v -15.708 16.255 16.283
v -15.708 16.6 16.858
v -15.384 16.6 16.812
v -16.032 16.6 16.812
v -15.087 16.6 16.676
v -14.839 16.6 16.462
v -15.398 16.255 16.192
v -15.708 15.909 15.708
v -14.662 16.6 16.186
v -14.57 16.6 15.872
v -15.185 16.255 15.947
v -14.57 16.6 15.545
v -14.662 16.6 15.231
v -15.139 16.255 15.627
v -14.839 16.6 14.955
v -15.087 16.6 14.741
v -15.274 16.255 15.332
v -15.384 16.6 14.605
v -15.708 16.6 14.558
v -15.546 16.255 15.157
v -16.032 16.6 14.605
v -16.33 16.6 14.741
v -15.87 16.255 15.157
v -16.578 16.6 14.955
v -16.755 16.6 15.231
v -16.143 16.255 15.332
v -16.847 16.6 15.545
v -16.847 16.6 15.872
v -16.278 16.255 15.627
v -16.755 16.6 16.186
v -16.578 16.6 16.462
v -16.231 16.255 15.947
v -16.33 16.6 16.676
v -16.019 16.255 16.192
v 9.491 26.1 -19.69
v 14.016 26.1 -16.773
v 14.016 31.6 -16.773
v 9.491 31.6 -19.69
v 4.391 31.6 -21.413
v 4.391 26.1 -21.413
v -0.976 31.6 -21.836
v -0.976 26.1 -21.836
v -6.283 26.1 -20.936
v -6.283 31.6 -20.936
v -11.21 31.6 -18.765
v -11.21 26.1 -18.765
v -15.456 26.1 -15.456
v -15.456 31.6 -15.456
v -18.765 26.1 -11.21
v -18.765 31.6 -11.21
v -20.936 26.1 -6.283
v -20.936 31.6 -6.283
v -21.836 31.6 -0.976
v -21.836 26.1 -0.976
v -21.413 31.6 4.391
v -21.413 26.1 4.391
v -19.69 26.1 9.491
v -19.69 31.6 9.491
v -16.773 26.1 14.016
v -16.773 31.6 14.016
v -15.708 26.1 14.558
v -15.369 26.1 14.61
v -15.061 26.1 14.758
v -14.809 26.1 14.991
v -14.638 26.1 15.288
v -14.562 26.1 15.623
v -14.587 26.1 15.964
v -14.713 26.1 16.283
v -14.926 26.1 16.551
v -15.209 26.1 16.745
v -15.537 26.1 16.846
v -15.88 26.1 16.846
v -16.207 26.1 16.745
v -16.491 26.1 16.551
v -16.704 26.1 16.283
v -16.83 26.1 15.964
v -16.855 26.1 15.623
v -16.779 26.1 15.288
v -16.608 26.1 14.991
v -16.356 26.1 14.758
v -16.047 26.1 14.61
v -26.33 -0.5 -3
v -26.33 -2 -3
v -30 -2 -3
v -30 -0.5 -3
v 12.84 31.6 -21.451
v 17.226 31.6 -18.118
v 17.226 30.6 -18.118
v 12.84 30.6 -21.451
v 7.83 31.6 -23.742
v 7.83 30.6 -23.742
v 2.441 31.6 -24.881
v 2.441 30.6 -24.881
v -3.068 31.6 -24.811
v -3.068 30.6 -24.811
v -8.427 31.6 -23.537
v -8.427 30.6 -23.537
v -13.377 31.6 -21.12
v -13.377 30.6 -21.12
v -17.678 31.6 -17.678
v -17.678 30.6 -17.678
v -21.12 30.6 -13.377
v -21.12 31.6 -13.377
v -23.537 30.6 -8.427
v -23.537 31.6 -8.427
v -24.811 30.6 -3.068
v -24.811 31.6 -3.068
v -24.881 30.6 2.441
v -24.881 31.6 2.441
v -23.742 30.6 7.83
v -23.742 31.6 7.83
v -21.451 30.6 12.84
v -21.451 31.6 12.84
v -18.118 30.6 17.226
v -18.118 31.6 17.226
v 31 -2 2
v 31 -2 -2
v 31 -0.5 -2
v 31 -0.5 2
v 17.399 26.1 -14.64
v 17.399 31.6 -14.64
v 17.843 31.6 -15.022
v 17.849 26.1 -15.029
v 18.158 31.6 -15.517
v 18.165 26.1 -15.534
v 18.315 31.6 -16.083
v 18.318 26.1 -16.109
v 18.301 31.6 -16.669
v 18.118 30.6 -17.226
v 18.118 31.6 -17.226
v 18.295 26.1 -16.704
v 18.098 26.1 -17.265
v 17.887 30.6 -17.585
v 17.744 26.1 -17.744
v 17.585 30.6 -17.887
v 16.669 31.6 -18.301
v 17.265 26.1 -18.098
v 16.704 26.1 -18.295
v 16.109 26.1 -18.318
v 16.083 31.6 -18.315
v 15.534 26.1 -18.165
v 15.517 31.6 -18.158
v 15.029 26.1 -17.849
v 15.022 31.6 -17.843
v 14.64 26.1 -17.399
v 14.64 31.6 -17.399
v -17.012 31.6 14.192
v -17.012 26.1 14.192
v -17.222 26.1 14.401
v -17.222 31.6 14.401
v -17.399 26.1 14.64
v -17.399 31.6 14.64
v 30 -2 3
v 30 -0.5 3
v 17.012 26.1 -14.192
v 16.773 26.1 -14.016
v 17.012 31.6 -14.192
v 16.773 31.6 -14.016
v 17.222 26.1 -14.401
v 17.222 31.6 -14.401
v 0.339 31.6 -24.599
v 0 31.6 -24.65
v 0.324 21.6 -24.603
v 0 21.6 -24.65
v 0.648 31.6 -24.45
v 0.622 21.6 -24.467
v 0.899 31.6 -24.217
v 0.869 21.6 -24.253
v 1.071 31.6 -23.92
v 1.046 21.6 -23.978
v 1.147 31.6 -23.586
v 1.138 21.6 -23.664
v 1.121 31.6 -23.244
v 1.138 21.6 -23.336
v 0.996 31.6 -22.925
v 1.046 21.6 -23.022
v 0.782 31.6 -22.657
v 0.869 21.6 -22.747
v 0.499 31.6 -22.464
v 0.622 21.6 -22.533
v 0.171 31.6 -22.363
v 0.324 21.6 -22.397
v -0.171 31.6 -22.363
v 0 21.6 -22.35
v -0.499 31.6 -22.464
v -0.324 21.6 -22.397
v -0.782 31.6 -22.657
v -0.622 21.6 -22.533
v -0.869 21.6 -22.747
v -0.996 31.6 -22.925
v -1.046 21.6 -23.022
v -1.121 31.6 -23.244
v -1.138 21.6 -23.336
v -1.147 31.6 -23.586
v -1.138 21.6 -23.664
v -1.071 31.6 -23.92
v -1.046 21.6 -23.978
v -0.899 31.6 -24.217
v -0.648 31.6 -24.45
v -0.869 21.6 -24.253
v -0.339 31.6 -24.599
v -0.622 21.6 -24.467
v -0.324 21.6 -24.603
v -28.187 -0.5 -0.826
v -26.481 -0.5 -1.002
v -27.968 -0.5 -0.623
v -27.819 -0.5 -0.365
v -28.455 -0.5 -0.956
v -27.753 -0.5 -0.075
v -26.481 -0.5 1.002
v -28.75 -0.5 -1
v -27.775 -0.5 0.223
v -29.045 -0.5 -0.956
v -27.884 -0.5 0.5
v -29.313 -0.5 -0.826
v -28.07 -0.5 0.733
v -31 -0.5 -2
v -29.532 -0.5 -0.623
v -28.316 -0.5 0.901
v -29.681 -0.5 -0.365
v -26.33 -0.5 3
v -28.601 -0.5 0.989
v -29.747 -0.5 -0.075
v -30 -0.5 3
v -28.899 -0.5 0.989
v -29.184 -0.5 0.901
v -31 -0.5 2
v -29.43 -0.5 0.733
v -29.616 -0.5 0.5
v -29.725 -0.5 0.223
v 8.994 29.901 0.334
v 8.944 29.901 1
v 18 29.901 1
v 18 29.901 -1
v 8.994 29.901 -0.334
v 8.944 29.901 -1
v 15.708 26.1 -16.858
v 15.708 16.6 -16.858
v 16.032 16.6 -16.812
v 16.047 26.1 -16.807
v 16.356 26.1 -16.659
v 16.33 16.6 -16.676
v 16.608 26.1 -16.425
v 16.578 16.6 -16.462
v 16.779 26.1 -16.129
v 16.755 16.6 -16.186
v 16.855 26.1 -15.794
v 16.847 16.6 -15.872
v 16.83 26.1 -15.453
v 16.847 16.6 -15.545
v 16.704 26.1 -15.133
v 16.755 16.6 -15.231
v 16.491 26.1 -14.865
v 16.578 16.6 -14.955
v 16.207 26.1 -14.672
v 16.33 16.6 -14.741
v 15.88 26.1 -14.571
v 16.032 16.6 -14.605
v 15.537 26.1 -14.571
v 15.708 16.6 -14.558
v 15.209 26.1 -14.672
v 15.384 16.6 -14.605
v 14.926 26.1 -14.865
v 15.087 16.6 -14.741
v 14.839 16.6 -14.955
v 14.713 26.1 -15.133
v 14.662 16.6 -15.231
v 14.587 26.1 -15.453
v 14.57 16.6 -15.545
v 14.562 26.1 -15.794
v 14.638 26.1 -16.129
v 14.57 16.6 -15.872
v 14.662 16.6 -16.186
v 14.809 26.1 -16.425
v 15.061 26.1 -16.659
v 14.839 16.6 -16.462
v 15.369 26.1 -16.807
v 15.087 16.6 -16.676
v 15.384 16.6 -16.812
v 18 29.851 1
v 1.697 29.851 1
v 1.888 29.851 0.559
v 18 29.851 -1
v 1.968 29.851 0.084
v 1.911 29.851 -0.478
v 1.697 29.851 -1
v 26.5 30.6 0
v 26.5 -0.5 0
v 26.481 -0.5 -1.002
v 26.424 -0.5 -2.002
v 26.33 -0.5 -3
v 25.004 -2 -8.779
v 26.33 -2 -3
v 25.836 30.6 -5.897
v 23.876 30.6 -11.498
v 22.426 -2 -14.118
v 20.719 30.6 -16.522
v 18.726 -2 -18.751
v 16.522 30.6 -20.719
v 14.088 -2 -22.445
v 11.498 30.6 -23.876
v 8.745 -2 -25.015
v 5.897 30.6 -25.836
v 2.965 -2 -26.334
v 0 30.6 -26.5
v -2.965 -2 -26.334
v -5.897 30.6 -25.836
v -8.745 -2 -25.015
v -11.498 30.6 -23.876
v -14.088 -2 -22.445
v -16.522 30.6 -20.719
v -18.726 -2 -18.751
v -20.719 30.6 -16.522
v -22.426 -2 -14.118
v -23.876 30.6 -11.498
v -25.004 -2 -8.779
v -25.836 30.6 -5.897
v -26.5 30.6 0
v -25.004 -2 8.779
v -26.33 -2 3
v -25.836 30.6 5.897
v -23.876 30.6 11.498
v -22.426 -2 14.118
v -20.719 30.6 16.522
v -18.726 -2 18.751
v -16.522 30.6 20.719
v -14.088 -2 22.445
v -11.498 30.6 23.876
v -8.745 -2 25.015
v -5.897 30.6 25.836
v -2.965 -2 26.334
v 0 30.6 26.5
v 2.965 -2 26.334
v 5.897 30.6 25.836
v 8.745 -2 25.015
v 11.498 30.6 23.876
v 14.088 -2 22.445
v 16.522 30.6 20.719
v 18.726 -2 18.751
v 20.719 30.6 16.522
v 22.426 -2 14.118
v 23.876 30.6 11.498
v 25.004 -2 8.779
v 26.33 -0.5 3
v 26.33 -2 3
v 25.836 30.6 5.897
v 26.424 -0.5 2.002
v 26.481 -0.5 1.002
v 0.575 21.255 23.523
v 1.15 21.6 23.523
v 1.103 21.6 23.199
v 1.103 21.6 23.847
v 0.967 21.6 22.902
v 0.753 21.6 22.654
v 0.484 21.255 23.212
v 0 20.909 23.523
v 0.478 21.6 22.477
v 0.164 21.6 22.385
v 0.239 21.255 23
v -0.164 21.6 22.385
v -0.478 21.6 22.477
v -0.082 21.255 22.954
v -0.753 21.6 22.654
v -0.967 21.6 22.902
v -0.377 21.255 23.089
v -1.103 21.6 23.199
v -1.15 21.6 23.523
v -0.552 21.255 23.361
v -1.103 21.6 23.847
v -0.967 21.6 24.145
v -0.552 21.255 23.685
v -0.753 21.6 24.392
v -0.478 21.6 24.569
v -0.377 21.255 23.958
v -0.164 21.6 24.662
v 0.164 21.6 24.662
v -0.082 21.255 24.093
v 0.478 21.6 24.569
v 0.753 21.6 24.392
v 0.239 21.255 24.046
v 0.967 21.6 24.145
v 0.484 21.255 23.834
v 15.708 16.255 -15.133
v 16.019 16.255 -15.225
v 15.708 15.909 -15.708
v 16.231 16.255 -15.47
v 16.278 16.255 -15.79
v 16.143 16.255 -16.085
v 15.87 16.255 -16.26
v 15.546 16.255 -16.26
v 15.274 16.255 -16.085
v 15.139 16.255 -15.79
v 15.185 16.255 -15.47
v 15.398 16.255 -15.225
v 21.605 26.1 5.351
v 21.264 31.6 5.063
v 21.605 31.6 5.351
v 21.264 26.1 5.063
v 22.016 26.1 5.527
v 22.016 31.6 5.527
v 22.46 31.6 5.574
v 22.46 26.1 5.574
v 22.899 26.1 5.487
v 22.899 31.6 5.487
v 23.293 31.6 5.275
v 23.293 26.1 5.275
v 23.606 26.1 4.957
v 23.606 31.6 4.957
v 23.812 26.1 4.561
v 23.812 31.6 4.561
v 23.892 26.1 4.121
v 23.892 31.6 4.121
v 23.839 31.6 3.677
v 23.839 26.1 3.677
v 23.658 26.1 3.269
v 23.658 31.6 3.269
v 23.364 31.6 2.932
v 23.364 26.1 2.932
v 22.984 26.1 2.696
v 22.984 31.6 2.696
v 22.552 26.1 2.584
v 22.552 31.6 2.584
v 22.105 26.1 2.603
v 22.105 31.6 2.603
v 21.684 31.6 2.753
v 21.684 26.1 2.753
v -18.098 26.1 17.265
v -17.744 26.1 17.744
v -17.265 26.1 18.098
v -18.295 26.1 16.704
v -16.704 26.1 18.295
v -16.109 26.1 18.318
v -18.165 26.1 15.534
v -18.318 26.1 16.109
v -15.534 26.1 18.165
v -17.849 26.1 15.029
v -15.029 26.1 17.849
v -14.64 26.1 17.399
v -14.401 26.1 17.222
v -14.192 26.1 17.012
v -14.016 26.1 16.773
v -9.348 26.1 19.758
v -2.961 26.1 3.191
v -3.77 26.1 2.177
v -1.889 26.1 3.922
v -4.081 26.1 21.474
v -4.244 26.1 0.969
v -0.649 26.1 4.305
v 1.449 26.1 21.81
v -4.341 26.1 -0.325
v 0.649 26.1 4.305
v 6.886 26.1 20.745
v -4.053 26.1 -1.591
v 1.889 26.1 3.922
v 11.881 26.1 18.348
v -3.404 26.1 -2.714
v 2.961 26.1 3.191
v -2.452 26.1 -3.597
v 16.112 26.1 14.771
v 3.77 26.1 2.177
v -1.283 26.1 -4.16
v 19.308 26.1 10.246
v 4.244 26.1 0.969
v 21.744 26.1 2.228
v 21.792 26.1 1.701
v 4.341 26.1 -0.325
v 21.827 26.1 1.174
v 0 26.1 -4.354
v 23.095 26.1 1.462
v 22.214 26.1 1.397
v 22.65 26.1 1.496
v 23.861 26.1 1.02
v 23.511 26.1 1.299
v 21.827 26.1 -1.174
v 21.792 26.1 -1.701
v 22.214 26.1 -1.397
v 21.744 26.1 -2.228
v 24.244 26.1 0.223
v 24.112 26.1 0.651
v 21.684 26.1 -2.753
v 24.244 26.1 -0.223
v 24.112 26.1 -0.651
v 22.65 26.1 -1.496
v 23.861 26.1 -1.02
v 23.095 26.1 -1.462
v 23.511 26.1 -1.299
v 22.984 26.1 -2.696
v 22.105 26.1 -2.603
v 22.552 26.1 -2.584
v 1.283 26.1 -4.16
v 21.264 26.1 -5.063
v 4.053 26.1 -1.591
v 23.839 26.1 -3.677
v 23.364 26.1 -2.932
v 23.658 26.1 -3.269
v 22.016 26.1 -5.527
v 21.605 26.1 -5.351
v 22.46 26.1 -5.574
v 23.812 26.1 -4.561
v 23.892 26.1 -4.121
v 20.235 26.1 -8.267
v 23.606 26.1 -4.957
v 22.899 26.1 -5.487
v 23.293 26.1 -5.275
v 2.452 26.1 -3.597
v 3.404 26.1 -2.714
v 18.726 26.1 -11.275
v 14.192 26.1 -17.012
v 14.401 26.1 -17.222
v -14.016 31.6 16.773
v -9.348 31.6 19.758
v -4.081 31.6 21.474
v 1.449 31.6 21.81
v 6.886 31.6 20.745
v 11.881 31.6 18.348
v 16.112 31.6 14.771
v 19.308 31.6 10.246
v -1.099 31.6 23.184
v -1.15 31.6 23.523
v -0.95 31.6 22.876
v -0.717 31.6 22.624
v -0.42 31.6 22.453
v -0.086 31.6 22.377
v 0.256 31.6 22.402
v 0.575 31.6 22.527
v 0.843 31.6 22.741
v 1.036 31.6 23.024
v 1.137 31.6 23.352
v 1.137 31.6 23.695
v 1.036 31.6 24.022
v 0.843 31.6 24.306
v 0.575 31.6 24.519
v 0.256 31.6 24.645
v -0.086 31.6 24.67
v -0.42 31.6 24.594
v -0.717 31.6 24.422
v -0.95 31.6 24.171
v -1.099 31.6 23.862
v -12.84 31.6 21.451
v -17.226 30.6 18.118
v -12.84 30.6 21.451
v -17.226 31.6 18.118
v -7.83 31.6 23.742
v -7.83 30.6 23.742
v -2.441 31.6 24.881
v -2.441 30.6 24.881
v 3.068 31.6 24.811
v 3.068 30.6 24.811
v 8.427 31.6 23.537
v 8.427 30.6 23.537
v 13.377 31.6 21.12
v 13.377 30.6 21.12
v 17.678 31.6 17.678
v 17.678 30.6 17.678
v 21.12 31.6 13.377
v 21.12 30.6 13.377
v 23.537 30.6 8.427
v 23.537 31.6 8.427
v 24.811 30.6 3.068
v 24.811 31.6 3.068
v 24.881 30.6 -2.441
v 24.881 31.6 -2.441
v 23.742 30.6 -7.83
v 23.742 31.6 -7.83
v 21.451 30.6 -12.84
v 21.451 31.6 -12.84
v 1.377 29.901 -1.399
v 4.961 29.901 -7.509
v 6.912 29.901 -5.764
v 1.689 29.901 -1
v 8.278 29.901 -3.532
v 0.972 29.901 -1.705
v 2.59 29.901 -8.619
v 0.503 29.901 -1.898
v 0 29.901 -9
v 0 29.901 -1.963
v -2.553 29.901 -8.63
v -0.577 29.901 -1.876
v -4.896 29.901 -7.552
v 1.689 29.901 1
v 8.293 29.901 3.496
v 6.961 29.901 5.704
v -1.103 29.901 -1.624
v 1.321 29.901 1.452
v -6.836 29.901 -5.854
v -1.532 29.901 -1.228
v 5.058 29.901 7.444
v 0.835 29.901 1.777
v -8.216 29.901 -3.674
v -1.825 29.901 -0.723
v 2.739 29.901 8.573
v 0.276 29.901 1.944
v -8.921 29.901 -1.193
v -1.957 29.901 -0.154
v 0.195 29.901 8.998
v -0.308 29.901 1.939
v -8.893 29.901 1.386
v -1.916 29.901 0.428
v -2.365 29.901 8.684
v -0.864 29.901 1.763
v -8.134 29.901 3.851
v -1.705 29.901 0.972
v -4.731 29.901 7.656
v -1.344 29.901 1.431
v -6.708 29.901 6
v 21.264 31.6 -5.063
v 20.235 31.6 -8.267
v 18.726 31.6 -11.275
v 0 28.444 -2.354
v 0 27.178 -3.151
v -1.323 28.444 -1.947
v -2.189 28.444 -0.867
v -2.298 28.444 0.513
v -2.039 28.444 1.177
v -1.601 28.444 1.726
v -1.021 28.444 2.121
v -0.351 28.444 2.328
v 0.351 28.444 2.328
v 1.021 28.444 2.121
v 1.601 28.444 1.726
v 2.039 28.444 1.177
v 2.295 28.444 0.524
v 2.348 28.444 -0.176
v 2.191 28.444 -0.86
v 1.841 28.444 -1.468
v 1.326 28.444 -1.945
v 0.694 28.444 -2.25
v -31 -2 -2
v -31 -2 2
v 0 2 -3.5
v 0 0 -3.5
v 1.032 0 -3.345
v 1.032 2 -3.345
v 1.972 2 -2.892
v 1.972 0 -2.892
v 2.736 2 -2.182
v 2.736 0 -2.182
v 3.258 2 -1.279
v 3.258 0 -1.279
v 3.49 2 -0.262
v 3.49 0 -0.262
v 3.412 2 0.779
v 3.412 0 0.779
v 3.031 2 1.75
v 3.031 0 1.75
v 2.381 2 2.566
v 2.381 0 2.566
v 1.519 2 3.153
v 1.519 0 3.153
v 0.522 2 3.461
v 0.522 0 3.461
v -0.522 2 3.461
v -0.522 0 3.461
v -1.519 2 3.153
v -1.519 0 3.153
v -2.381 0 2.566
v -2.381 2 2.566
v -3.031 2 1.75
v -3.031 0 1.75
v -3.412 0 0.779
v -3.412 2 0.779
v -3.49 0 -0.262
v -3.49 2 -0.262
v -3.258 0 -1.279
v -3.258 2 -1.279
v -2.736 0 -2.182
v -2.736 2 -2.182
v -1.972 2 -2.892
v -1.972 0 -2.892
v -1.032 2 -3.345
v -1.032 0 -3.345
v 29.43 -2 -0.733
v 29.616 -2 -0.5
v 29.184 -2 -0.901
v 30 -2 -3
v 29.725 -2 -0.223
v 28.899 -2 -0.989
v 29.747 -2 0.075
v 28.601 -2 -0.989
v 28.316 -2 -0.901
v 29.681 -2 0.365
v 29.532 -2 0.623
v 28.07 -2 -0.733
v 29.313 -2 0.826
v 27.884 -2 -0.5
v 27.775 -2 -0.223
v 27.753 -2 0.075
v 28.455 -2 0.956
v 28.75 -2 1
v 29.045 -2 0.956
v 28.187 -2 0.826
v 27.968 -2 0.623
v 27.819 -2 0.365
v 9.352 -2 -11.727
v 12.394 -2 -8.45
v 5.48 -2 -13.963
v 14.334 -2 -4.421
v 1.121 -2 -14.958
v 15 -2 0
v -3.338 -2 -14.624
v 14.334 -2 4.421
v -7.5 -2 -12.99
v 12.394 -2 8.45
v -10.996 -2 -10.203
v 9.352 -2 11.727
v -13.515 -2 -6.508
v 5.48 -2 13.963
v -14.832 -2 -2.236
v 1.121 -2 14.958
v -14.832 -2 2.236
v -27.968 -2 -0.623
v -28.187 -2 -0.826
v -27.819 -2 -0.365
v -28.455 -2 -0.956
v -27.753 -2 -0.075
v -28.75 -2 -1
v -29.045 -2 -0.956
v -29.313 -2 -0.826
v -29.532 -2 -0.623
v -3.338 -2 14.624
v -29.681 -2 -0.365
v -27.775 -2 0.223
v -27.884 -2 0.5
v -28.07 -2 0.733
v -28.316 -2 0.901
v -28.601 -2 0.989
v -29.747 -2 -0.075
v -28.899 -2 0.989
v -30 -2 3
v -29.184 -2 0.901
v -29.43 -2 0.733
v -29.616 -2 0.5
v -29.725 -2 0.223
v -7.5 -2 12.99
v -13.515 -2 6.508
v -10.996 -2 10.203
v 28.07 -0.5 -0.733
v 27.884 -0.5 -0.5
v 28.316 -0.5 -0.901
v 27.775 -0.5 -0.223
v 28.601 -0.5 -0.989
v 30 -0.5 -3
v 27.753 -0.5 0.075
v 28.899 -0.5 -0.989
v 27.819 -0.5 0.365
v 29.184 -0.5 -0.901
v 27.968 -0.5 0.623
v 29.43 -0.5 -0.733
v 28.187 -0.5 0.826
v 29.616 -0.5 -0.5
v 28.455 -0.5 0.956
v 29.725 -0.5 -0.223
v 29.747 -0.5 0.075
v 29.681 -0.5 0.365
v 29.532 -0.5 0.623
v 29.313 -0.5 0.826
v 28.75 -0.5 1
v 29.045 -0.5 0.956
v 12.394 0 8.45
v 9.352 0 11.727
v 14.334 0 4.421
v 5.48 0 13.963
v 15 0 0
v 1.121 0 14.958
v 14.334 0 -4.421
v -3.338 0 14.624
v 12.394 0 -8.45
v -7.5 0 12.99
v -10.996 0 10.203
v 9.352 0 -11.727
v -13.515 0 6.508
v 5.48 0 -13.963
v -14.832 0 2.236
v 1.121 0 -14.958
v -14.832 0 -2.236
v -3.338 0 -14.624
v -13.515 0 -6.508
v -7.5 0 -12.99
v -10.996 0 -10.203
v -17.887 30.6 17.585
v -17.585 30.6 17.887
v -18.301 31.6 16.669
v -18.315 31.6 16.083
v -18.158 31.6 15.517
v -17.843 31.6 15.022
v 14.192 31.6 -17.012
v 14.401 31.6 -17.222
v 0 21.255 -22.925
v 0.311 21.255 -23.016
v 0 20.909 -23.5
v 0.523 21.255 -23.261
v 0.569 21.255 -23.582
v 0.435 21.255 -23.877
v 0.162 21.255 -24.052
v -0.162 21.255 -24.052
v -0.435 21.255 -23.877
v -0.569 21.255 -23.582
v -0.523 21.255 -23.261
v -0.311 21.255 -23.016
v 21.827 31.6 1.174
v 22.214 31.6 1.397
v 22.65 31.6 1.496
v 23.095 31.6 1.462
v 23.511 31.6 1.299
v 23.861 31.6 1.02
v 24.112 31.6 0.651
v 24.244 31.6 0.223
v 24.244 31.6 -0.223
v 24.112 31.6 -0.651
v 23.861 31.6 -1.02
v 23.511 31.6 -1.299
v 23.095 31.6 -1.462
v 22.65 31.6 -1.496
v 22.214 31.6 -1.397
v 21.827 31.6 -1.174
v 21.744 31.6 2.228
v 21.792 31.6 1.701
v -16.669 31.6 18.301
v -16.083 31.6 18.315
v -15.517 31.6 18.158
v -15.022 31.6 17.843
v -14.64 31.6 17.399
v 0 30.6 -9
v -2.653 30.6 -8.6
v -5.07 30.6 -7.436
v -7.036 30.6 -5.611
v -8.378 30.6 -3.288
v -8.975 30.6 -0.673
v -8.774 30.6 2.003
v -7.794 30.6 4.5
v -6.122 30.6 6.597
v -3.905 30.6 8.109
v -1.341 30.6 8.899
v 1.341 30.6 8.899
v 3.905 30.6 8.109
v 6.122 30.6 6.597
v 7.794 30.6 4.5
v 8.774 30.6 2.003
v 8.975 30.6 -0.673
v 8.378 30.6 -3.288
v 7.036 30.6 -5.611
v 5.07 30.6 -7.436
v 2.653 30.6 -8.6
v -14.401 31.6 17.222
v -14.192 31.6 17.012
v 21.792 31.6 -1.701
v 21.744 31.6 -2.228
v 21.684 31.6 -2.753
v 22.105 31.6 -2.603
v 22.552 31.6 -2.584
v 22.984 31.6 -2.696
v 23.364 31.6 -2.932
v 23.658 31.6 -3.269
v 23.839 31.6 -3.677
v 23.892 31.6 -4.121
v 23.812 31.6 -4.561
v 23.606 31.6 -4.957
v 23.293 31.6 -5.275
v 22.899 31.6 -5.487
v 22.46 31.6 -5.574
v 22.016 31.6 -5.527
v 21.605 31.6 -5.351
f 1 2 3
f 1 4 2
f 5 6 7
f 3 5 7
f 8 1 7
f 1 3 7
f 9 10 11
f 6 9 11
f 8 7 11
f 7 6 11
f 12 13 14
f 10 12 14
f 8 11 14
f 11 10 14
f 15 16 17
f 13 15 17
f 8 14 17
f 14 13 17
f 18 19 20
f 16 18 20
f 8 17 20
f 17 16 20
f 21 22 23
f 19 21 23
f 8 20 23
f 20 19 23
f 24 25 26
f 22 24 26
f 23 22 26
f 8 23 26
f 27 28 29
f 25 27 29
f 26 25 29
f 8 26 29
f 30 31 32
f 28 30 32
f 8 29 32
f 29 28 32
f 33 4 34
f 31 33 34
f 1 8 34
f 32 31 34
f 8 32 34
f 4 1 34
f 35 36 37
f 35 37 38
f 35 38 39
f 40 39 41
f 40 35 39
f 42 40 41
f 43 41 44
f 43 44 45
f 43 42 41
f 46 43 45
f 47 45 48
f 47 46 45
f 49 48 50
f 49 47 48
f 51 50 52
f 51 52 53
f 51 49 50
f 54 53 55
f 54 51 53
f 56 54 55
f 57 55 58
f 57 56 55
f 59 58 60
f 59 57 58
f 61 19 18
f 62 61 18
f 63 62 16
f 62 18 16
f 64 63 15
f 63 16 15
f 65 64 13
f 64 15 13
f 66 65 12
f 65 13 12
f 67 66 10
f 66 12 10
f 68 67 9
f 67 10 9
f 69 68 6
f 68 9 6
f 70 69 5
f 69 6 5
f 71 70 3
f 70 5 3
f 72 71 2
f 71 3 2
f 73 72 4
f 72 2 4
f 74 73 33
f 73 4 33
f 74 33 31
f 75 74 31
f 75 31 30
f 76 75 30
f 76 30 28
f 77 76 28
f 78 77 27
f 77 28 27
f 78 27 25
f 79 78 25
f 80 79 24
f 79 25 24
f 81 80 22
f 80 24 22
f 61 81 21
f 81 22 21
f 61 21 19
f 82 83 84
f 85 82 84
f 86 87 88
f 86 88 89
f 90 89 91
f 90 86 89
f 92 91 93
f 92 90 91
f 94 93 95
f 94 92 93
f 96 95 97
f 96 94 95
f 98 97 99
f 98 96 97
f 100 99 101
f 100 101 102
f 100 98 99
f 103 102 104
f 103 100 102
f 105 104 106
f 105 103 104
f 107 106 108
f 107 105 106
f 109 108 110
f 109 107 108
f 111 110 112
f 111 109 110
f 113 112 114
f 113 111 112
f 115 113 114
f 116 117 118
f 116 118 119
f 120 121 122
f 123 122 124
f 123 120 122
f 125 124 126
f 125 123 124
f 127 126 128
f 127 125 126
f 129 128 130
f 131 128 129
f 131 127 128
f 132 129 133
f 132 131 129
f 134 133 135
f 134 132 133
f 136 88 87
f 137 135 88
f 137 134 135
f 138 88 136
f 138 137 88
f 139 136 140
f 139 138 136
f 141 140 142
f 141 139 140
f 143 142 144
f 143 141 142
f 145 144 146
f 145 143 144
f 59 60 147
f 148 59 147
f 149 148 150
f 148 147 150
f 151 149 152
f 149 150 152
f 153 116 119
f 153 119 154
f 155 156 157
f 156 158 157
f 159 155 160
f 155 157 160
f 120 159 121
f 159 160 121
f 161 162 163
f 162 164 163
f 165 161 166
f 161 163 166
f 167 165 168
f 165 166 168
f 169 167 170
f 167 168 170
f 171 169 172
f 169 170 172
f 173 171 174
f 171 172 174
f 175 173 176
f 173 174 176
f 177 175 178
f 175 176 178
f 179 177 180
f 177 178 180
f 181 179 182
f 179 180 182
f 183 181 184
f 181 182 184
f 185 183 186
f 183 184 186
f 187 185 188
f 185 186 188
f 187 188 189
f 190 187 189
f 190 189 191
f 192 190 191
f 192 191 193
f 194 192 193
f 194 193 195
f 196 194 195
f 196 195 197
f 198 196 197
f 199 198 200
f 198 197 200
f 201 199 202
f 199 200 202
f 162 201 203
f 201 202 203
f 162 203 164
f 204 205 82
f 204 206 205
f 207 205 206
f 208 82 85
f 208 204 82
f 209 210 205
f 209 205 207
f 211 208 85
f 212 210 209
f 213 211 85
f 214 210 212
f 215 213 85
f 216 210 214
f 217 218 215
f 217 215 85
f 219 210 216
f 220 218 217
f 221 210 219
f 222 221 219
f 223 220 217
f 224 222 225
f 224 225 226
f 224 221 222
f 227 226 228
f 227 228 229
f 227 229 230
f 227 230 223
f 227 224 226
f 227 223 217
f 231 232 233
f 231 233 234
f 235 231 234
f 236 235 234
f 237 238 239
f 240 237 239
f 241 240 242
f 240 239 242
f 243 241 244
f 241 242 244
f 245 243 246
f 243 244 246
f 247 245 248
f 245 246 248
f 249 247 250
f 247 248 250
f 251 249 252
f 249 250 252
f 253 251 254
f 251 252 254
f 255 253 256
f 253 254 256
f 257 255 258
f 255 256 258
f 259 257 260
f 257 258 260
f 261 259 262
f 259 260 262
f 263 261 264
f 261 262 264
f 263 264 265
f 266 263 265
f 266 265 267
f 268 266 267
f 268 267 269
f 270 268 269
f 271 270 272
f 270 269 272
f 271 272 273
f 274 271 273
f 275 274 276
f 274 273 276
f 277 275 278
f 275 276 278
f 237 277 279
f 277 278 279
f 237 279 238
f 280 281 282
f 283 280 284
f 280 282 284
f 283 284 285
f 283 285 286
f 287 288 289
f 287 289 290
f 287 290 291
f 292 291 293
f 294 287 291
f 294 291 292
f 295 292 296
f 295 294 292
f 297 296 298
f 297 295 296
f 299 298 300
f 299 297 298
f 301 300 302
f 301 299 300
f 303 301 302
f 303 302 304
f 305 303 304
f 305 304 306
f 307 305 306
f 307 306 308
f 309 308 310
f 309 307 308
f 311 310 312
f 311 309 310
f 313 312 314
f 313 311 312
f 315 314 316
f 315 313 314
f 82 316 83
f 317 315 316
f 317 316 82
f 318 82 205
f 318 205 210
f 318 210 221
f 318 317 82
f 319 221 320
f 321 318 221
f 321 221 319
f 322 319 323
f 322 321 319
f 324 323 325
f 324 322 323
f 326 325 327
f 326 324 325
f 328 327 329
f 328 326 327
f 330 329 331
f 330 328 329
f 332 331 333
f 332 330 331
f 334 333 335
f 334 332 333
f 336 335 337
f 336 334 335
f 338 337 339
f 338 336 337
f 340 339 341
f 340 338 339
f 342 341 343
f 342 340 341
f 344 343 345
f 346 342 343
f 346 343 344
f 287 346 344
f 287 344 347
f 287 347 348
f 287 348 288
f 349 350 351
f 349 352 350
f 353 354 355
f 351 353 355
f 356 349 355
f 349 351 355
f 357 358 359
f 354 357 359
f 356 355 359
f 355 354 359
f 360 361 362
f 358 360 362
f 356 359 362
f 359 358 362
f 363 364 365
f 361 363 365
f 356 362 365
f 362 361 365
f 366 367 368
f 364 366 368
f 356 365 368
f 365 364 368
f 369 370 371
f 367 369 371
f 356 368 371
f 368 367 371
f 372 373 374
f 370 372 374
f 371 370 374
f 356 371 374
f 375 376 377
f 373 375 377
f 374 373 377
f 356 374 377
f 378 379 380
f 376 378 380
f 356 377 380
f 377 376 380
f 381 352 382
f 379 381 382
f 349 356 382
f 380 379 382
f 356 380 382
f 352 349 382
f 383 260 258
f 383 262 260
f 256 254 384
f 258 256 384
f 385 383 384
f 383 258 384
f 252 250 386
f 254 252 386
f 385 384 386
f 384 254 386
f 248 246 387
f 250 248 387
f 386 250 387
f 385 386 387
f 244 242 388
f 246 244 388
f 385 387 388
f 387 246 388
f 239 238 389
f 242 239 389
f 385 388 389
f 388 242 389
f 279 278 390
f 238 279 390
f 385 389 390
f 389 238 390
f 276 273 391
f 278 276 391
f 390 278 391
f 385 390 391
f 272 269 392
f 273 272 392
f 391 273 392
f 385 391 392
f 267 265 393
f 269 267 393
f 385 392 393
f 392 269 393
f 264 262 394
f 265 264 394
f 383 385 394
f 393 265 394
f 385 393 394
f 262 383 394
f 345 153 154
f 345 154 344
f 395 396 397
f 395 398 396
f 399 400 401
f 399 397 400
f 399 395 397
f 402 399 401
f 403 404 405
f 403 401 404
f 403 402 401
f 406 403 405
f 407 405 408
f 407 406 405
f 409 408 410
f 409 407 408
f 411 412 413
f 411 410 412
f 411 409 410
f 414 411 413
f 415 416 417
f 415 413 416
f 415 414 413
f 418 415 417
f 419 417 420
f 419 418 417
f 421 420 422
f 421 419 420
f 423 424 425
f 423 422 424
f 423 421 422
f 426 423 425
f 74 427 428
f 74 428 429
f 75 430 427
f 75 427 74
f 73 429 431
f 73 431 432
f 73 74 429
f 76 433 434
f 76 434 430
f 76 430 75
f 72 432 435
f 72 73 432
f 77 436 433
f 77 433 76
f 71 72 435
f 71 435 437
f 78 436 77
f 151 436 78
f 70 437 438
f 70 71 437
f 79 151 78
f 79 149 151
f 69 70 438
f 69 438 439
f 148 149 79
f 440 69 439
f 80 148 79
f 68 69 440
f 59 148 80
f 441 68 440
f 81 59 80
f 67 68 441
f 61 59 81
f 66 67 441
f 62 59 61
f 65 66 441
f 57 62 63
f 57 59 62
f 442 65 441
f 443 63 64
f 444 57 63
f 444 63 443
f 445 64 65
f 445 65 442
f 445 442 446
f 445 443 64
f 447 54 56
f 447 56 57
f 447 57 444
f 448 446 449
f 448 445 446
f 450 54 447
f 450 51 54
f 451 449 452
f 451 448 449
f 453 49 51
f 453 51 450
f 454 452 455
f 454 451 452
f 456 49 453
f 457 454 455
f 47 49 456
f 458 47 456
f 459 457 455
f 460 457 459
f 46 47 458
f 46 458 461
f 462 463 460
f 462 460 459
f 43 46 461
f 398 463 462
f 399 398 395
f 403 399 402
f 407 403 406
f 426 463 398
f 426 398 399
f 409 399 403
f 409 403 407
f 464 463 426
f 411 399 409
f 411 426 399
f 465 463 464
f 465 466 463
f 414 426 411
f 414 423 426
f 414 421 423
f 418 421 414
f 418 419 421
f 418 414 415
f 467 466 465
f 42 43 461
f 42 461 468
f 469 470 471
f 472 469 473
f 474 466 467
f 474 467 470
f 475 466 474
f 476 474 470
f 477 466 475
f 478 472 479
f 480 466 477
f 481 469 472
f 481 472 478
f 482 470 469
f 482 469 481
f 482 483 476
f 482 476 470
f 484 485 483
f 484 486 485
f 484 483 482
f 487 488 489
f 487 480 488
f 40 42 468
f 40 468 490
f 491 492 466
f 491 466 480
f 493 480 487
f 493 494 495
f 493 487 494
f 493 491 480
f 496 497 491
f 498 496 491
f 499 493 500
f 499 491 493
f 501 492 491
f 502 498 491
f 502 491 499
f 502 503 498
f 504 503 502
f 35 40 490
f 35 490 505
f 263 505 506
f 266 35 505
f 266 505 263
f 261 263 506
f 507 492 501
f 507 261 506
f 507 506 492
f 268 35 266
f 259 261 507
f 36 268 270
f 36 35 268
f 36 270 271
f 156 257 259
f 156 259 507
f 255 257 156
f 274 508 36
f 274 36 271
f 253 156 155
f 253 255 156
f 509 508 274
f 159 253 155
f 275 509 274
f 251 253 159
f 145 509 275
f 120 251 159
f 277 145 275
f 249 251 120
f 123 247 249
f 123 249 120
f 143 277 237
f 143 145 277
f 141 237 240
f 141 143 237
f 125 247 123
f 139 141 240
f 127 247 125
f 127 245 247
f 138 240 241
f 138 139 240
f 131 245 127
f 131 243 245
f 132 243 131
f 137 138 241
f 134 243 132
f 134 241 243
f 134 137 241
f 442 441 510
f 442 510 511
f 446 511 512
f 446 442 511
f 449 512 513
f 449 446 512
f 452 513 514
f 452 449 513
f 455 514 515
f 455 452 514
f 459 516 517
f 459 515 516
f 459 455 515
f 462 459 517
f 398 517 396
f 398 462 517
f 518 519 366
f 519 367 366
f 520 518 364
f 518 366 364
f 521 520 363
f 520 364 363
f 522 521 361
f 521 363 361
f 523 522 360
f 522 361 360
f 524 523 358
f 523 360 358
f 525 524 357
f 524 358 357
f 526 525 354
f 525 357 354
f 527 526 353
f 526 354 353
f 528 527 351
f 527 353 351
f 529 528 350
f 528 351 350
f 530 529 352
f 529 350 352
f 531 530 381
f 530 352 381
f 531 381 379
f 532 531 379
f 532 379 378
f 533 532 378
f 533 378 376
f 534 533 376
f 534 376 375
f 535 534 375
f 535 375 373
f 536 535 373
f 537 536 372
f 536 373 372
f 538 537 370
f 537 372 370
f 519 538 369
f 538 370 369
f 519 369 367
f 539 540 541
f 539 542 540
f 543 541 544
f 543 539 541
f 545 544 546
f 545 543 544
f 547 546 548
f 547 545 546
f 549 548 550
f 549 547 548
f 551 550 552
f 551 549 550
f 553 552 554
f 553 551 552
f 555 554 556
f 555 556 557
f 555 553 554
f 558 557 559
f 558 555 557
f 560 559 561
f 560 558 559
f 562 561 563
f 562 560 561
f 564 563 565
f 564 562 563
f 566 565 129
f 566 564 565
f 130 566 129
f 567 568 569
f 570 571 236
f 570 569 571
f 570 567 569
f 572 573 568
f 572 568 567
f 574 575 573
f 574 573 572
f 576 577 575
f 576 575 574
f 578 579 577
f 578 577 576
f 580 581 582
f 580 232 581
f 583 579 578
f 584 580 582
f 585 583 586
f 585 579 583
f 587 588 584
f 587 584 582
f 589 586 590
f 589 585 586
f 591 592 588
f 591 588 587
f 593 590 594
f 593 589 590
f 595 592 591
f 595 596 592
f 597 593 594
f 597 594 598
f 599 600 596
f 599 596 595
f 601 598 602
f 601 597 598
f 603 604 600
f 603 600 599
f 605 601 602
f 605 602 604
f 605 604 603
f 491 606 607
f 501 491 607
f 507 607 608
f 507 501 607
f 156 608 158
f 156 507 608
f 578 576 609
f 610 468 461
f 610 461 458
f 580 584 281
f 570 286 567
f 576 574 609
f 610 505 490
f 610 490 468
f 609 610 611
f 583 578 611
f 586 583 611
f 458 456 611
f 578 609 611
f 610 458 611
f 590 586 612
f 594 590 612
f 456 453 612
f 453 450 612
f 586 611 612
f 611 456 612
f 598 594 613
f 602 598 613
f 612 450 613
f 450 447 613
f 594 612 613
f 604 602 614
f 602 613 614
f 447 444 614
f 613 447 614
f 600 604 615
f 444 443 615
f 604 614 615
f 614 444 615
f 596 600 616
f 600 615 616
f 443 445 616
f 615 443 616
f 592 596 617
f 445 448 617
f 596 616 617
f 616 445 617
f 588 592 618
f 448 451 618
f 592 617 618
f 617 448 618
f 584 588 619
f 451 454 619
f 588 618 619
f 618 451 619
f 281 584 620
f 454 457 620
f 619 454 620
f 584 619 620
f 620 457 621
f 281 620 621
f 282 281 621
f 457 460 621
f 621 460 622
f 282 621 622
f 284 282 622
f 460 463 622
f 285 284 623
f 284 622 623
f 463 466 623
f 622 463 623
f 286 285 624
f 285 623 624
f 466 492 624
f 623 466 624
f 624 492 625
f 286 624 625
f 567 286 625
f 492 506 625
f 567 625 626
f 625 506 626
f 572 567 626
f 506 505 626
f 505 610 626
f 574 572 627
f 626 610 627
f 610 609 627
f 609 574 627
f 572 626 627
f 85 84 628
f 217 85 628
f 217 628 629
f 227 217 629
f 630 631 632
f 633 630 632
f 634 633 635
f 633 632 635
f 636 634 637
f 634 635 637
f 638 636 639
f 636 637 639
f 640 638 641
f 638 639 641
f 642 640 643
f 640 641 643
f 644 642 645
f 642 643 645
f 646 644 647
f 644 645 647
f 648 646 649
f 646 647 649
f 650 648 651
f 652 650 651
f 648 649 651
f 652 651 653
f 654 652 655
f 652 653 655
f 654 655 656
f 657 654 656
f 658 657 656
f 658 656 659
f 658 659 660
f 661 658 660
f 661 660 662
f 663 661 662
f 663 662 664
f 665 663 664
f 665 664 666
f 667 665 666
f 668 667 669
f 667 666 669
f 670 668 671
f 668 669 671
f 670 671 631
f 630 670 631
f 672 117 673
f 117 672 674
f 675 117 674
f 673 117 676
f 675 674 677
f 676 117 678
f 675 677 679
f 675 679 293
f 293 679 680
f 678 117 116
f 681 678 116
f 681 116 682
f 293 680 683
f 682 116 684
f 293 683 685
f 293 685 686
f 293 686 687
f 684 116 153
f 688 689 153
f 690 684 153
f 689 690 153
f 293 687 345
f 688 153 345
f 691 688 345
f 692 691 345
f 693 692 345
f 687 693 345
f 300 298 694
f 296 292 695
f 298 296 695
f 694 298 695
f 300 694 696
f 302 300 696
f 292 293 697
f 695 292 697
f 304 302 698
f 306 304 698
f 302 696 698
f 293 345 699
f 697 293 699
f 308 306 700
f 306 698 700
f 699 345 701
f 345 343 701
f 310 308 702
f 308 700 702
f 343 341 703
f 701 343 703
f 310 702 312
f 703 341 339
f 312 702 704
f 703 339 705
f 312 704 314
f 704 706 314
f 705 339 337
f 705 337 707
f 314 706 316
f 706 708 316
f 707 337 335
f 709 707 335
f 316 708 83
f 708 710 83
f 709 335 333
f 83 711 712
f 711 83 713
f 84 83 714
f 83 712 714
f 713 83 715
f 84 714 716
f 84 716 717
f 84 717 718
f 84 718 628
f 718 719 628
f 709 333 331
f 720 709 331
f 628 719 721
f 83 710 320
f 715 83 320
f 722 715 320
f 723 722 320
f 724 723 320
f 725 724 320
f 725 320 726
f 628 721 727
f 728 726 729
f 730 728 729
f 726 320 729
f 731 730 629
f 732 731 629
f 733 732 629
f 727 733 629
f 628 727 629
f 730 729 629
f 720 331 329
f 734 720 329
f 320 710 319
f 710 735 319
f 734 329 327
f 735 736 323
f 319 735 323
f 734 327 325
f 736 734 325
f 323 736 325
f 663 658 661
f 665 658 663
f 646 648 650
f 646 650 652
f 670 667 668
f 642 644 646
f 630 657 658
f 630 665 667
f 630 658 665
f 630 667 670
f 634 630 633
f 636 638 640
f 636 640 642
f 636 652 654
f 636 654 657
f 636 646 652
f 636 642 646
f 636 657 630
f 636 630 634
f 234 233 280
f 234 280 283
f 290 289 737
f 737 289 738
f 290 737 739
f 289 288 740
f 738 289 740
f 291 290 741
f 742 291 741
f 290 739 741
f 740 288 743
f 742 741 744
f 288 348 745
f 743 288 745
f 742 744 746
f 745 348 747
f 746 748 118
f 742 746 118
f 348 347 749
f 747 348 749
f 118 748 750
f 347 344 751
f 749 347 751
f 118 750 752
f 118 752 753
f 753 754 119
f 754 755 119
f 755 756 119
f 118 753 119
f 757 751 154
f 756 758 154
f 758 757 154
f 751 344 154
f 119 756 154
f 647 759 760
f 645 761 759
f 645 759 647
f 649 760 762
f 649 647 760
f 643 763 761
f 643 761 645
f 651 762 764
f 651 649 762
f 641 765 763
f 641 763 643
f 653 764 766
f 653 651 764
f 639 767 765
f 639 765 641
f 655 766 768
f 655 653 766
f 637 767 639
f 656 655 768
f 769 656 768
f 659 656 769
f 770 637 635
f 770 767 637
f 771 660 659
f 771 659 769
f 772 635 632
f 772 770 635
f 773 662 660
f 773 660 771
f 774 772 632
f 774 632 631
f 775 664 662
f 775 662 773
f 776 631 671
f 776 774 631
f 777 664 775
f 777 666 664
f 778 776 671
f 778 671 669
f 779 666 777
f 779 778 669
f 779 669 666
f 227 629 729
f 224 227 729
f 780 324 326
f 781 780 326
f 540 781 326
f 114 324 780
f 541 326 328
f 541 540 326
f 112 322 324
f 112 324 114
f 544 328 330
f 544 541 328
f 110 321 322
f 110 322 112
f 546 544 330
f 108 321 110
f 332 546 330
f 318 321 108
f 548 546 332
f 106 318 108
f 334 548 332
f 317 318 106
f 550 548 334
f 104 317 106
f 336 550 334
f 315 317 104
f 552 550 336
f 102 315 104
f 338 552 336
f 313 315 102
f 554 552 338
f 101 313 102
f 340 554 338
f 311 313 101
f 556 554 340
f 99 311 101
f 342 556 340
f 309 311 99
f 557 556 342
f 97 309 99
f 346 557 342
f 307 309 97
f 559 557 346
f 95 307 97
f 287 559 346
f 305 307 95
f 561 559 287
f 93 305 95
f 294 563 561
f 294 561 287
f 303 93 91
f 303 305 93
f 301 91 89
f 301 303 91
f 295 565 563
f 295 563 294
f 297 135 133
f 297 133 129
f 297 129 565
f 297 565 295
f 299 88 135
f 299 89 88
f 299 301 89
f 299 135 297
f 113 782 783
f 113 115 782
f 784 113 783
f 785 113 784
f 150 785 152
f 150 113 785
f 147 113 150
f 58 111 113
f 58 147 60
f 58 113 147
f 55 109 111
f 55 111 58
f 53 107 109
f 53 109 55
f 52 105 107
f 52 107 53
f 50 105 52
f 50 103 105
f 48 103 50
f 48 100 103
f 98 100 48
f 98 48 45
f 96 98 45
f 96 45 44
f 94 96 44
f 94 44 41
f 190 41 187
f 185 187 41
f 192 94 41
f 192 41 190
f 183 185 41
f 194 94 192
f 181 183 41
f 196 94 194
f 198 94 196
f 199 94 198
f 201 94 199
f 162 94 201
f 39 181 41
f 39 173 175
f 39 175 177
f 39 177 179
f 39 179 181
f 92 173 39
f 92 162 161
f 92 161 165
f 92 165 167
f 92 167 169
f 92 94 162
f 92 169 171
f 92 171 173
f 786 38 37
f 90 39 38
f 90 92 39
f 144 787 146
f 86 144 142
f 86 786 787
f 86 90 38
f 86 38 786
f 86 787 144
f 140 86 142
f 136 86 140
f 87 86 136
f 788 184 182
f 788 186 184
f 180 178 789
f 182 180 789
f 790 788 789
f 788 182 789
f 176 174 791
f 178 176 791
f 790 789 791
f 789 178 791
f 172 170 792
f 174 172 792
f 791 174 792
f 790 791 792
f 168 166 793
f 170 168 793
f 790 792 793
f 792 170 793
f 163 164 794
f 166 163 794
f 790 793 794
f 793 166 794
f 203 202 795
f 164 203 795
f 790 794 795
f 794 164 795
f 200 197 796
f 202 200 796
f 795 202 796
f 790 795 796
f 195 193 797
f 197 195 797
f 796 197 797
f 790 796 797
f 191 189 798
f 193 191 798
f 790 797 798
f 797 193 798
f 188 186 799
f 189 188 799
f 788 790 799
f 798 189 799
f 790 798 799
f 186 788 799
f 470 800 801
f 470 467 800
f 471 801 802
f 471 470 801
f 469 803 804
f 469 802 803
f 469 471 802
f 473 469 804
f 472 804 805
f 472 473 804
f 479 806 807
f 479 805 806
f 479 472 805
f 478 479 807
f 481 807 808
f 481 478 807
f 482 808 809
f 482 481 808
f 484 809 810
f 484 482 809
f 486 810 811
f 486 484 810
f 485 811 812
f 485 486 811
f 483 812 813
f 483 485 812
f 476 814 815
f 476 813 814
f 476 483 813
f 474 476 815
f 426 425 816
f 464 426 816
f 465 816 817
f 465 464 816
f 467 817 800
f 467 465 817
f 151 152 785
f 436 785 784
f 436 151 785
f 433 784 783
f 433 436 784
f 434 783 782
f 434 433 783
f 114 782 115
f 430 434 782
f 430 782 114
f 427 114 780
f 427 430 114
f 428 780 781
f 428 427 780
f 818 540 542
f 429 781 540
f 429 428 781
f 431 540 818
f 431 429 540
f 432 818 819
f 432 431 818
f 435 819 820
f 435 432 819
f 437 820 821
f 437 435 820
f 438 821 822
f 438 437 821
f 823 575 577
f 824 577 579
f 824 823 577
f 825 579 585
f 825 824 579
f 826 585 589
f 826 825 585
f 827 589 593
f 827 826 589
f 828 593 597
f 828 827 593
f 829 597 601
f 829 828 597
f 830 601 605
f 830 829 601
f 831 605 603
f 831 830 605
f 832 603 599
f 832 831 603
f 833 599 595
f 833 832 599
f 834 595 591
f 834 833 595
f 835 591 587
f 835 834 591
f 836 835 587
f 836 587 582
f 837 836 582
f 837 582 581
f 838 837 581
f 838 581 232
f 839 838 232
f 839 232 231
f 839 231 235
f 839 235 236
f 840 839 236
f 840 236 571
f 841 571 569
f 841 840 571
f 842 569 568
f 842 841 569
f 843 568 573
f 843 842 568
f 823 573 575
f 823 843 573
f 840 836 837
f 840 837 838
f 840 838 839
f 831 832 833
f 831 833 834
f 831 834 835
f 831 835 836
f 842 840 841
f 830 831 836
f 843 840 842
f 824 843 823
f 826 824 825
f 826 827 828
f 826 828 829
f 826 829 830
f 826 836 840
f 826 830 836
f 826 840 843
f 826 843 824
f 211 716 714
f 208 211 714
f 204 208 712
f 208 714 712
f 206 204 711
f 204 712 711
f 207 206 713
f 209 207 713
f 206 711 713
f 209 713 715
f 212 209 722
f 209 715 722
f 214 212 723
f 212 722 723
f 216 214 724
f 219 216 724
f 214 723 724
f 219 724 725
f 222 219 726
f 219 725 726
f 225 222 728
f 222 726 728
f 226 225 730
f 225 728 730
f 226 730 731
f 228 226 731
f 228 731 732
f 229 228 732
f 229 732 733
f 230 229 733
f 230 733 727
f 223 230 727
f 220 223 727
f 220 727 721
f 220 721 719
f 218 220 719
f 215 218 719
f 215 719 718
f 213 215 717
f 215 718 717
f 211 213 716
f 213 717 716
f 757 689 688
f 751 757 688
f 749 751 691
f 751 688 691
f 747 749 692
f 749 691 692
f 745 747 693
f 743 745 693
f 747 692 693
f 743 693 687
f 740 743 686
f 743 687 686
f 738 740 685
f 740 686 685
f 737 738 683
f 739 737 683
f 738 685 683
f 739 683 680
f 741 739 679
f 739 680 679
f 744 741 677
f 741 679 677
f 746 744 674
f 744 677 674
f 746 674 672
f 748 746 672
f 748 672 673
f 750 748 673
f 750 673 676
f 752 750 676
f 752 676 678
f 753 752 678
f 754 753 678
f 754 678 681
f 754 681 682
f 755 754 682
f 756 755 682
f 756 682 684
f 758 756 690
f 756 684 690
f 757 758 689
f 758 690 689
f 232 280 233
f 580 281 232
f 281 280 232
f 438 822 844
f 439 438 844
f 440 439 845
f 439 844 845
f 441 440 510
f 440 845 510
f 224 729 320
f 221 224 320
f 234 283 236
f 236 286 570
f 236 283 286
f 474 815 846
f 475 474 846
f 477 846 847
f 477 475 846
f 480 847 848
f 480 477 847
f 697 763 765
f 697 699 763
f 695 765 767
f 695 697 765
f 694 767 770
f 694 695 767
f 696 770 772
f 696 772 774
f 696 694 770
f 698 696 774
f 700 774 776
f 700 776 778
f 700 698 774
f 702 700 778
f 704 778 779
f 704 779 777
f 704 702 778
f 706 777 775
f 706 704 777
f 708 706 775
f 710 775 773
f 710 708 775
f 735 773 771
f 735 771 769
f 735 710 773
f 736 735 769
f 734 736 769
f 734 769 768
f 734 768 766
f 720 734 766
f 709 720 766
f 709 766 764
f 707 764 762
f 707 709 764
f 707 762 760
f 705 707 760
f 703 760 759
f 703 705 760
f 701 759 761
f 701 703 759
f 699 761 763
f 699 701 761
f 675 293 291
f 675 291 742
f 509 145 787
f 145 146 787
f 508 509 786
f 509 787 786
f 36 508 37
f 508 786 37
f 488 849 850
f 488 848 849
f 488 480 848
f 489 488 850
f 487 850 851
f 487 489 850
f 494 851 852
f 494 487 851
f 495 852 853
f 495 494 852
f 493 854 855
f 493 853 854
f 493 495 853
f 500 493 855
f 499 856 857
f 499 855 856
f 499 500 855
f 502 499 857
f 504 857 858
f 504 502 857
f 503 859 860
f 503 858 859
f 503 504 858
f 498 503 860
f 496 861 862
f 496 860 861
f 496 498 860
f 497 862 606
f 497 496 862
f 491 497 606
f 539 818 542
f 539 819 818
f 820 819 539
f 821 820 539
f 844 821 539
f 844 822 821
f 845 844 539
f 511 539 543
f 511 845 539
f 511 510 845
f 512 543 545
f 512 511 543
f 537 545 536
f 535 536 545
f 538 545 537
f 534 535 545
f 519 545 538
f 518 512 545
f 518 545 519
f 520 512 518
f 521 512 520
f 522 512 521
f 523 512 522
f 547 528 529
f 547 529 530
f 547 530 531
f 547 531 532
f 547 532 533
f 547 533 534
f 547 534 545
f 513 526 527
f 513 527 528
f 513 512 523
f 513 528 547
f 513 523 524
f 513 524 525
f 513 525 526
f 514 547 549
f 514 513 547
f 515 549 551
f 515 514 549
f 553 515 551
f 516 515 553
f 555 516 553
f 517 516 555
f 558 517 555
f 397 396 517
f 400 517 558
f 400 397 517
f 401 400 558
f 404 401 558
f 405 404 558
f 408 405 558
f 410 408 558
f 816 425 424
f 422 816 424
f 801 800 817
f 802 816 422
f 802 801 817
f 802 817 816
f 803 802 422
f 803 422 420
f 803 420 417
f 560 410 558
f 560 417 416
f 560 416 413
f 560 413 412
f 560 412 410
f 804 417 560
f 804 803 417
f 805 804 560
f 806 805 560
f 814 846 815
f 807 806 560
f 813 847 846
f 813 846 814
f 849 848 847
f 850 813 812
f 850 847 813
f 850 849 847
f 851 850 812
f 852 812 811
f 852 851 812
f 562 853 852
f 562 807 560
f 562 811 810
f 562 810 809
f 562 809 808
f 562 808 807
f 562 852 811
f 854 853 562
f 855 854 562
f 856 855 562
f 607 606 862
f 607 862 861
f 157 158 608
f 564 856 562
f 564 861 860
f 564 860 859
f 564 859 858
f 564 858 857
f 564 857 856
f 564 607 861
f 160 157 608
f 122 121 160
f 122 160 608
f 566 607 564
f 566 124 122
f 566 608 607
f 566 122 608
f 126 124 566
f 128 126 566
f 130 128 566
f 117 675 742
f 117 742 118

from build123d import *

# Parameters (mm, degrees)
SKETCH_2_R              = 1
EXTRUDE_1_DEPTH         = 1.5
SKETCH_4_R              = 3.5
CUT_EXTRUDE_1_DEPTH     = 2
HOLE_WIZARD_M2_21_D     = 2.3
HOLE_WIZARD_M2_21_DEPTH = 10
HOLE_WIZARD_M2_21_TIP   = 0.690989712
HOLE_WIZARD_M2_22_D     = 2.3
HOLE_WIZARD_M2_22_DEPTH = 10
HOLE_WIZARD_M2_22_TIP   = 0.690989712
SKETCH_18_R             = 2
CUT_EXTRUDE_3_DEPTH     = 5.5
HOLE_WIZARD_M2_23_D     = 2.3
HOLE_WIZARD_M2_23_DEPTH = 15
HOLE_WIZARD_M2_23_TIP   = 0.690989712
CUT_EXTRUDE_START       = -5.5
SKETCH_20_R             = 1.5
CUT_EXTRUDE_4_DEPTH     = 5.5
SKETCH_8_W              = 2
SKETCH_8_H              = 0.05
EXTRUDE_3_DEPTH         = 18
SKETCH_9_R              = 2
CUT_EXTRUDE_2_DEPTH     = 5.5


# Read off the part's stored shape, not the designer's step: Повернуть1
with BuildPart() as part:
    # Повернуть1 outline → Повернуть1 (revolve)
    with BuildSketch(Plane.XY):
        Polygon((0, 26.1), (0, 0), (15, 0), (15, -2), (26.5, -2), (26.5, 30.6), (25, 30.6), (25, 31.6), (21.858230866, 31.6), (21.858230866, 26.1), align=None)
    revolve(axis=Axis((0, 0, 0), (0, 1, 0)))

    # Эскиз2 → Бобышка-Вытянуть1 (add)
    # profile 1 of 2: a face of its own
    with BuildSketch(Plane.XZ.offset(2)):
        Polygon((-31, -2), (-31, 2), (-30, 3), (-26.329641091, 3), (-26.329641091, -3), (-30, -3), align=None)
        with Locations(Location((-28.75, 0, 0), (0, 0, 270))):
            Circle(SKETCH_2_R, mode=Mode.SUBTRACT)
    # profile 2 of 2: a face of its own
    with BuildSketch(Plane.XZ.offset(2)):
        Polygon((30, 3), (26.329641091, 3), (26.329641091, -3), (30, -3), (31, -2), (31, 2), align=None)
        with Locations(Location((28.75, 0, 0), (0, 0, 90))):
            Circle(SKETCH_2_R, mode=Mode.SUBTRACT)
    extrude(amount=-EXTRUDE_1_DEPTH)

    # Эскиз4 → Вырез-Вытянуть1 (cut)
    with BuildSketch(Plane.XZ):
        with Locations(Location((0, 0, 0), (0, 0, 270))):
            Circle(SKETCH_4_R)
    extrude(amount=-CUT_EXTRUDE_1_DEPTH, mode=Mode.SUBTRACT)

    # Эскиз7 → Повернуть2 (revolve)
    with BuildSketch(Plane.XY, mode=Mode.PRIVATE) as revolve_2_sk:
        with BuildLine():
            Line((-1.963060758, 29.900525332), (-9, 29.900525332))
            Line((-9, 29.900525332), (-9, 30.6))
            Line((-9, 30.6), (0, 30.6))
            Line((0, 30.6), (0, 26.1))
            Line((0, 26.1), (-4.353608906, 26.1))
            add(Edge.make_bspline(
                [(-1.963060758, 29.900525332), (-2.24555005, 27.574534407), (-4.353608906, 26.1)],
                knots=[0, 0, 0, 1, 1, 1], degree=2))
        make_face()
    revolve(revolve_2_sk.sketch.rotate(Axis((0, 26.1, 0), (0, 1, 0)), 270), axis=Axis((0, 26.1, 0), (0, 1, 0)))

    # Сверло под метчик  спиральное M2.21
    with Locations(Plane(origin=(0, 31.6, 0), x_dir=(1, 0, 0), z_dir=(0, 1, 0))):
        with Locations((0, -23.523355069)):
            Hole(HOLE_WIZARD_M2_21_D / 2, depth=HOLE_WIZARD_M2_21_DEPTH)
            with Locations((0, 0, -(HOLE_WIZARD_M2_21_DEPTH + HOLE_WIZARD_M2_21_TIP / 2))):  # 118° drill point
                Cone(0, HOLE_WIZARD_M2_21_D / 2, HOLE_WIZARD_M2_21_TIP, mode=Mode.SUBTRACT)

    # Сверло под метчик  спиральное M2.22
    with Locations(Plane(origin=(0, 31.6, -23.5), x_dir=(0, 0, 1), z_dir=(0, 1, 0))):
        with Locations((0, 0)):
            Hole(HOLE_WIZARD_M2_22_D / 2, depth=HOLE_WIZARD_M2_22_DEPTH)
            with Locations((0, 0, -(HOLE_WIZARD_M2_22_DEPTH + HOLE_WIZARD_M2_22_TIP / 2))):  # 118° drill point
                Cone(0, HOLE_WIZARD_M2_22_D / 2, HOLE_WIZARD_M2_22_TIP, mode=Mode.SUBTRACT)

    # Эскиз18 → Вырез-Вытянуть3 (cut)
    with BuildSketch(Plane(origin=(0, 31.6, 0), x_dir=(1, 0, 0), z_dir=(0, 1, 0))):
        with Locations((15.708448043, 15.708448043)):
            Circle(SKETCH_18_R)
        with Locations((-15.708448043, -15.708448043)):
            Circle(SKETCH_18_R)
    extrude(amount=-CUT_EXTRUDE_3_DEPTH, mode=Mode.SUBTRACT)

    # Сверло под метчик  спиральное M2.23
    with Locations(Plane(origin=(-15.708448043, 31.6, 15.708448043), x_dir=(0, 0, 1), z_dir=(0, 1, 0))):
        with Locations((0, 0), (-31.416896086, 31.416896086)):
            Hole(HOLE_WIZARD_M2_23_D / 2, depth=HOLE_WIZARD_M2_23_DEPTH)
            with Locations((0, 0, -(HOLE_WIZARD_M2_23_DEPTH + HOLE_WIZARD_M2_23_TIP / 2))):  # 118° drill point
                Cone(0, HOLE_WIZARD_M2_23_D / 2, HOLE_WIZARD_M2_23_TIP, mode=Mode.SUBTRACT)

    # Эскиз20 → Вырез-Вытянуть4 (cut)
    with BuildSketch(Plane(origin=(0, 31.6, 0), x_dir=(1, 0, 0), z_dir=(0, 1, 0)).offset(CUT_EXTRUDE_START)):
        with Locations((22.760809842, 0)):
            Circle(SKETCH_20_R)
        with Locations((22.393028951, 4.075134238)):
            Circle(SKETCH_20_R)
        with Locations((22.393028951, -4.075134238)):
            Circle(SKETCH_20_R)
    extrude(amount=CUT_EXTRUDE_4_DEPTH, mode=Mode.SUBTRACT)

    # Эскиз8 → Бобышка-Вытянуть3 (add)
    with BuildSketch(Plane(origin=(0, 0, 0), x_dir=(0, 0, -1), z_dir=(1, 0, 0))):
        with Locations((0, 29.875525332)):
            Rectangle(SKETCH_8_W, SKETCH_8_H)
    extrude(amount=EXTRUDE_3_DEPTH)

    # Эскиз9 → Вырез-Вытянуть2 (cut)
    with BuildSketch(Plane(origin=(0, 31.6, 0), x_dir=(1, 0, 0), z_dir=(0, 1, 0)).offset(CUT_EXTRUDE_START)):
        with Locations((-16.330009516, -16.330009516)):
            Circle(SKETCH_9_R)
        with Locations((16.330009516, 16.330009516)):
            Circle(SKETCH_9_R)
    extrude(amount=CUT_EXTRUDE_2_DEPTH, mode=Mode.SUBTRACT)


solid = part.part
